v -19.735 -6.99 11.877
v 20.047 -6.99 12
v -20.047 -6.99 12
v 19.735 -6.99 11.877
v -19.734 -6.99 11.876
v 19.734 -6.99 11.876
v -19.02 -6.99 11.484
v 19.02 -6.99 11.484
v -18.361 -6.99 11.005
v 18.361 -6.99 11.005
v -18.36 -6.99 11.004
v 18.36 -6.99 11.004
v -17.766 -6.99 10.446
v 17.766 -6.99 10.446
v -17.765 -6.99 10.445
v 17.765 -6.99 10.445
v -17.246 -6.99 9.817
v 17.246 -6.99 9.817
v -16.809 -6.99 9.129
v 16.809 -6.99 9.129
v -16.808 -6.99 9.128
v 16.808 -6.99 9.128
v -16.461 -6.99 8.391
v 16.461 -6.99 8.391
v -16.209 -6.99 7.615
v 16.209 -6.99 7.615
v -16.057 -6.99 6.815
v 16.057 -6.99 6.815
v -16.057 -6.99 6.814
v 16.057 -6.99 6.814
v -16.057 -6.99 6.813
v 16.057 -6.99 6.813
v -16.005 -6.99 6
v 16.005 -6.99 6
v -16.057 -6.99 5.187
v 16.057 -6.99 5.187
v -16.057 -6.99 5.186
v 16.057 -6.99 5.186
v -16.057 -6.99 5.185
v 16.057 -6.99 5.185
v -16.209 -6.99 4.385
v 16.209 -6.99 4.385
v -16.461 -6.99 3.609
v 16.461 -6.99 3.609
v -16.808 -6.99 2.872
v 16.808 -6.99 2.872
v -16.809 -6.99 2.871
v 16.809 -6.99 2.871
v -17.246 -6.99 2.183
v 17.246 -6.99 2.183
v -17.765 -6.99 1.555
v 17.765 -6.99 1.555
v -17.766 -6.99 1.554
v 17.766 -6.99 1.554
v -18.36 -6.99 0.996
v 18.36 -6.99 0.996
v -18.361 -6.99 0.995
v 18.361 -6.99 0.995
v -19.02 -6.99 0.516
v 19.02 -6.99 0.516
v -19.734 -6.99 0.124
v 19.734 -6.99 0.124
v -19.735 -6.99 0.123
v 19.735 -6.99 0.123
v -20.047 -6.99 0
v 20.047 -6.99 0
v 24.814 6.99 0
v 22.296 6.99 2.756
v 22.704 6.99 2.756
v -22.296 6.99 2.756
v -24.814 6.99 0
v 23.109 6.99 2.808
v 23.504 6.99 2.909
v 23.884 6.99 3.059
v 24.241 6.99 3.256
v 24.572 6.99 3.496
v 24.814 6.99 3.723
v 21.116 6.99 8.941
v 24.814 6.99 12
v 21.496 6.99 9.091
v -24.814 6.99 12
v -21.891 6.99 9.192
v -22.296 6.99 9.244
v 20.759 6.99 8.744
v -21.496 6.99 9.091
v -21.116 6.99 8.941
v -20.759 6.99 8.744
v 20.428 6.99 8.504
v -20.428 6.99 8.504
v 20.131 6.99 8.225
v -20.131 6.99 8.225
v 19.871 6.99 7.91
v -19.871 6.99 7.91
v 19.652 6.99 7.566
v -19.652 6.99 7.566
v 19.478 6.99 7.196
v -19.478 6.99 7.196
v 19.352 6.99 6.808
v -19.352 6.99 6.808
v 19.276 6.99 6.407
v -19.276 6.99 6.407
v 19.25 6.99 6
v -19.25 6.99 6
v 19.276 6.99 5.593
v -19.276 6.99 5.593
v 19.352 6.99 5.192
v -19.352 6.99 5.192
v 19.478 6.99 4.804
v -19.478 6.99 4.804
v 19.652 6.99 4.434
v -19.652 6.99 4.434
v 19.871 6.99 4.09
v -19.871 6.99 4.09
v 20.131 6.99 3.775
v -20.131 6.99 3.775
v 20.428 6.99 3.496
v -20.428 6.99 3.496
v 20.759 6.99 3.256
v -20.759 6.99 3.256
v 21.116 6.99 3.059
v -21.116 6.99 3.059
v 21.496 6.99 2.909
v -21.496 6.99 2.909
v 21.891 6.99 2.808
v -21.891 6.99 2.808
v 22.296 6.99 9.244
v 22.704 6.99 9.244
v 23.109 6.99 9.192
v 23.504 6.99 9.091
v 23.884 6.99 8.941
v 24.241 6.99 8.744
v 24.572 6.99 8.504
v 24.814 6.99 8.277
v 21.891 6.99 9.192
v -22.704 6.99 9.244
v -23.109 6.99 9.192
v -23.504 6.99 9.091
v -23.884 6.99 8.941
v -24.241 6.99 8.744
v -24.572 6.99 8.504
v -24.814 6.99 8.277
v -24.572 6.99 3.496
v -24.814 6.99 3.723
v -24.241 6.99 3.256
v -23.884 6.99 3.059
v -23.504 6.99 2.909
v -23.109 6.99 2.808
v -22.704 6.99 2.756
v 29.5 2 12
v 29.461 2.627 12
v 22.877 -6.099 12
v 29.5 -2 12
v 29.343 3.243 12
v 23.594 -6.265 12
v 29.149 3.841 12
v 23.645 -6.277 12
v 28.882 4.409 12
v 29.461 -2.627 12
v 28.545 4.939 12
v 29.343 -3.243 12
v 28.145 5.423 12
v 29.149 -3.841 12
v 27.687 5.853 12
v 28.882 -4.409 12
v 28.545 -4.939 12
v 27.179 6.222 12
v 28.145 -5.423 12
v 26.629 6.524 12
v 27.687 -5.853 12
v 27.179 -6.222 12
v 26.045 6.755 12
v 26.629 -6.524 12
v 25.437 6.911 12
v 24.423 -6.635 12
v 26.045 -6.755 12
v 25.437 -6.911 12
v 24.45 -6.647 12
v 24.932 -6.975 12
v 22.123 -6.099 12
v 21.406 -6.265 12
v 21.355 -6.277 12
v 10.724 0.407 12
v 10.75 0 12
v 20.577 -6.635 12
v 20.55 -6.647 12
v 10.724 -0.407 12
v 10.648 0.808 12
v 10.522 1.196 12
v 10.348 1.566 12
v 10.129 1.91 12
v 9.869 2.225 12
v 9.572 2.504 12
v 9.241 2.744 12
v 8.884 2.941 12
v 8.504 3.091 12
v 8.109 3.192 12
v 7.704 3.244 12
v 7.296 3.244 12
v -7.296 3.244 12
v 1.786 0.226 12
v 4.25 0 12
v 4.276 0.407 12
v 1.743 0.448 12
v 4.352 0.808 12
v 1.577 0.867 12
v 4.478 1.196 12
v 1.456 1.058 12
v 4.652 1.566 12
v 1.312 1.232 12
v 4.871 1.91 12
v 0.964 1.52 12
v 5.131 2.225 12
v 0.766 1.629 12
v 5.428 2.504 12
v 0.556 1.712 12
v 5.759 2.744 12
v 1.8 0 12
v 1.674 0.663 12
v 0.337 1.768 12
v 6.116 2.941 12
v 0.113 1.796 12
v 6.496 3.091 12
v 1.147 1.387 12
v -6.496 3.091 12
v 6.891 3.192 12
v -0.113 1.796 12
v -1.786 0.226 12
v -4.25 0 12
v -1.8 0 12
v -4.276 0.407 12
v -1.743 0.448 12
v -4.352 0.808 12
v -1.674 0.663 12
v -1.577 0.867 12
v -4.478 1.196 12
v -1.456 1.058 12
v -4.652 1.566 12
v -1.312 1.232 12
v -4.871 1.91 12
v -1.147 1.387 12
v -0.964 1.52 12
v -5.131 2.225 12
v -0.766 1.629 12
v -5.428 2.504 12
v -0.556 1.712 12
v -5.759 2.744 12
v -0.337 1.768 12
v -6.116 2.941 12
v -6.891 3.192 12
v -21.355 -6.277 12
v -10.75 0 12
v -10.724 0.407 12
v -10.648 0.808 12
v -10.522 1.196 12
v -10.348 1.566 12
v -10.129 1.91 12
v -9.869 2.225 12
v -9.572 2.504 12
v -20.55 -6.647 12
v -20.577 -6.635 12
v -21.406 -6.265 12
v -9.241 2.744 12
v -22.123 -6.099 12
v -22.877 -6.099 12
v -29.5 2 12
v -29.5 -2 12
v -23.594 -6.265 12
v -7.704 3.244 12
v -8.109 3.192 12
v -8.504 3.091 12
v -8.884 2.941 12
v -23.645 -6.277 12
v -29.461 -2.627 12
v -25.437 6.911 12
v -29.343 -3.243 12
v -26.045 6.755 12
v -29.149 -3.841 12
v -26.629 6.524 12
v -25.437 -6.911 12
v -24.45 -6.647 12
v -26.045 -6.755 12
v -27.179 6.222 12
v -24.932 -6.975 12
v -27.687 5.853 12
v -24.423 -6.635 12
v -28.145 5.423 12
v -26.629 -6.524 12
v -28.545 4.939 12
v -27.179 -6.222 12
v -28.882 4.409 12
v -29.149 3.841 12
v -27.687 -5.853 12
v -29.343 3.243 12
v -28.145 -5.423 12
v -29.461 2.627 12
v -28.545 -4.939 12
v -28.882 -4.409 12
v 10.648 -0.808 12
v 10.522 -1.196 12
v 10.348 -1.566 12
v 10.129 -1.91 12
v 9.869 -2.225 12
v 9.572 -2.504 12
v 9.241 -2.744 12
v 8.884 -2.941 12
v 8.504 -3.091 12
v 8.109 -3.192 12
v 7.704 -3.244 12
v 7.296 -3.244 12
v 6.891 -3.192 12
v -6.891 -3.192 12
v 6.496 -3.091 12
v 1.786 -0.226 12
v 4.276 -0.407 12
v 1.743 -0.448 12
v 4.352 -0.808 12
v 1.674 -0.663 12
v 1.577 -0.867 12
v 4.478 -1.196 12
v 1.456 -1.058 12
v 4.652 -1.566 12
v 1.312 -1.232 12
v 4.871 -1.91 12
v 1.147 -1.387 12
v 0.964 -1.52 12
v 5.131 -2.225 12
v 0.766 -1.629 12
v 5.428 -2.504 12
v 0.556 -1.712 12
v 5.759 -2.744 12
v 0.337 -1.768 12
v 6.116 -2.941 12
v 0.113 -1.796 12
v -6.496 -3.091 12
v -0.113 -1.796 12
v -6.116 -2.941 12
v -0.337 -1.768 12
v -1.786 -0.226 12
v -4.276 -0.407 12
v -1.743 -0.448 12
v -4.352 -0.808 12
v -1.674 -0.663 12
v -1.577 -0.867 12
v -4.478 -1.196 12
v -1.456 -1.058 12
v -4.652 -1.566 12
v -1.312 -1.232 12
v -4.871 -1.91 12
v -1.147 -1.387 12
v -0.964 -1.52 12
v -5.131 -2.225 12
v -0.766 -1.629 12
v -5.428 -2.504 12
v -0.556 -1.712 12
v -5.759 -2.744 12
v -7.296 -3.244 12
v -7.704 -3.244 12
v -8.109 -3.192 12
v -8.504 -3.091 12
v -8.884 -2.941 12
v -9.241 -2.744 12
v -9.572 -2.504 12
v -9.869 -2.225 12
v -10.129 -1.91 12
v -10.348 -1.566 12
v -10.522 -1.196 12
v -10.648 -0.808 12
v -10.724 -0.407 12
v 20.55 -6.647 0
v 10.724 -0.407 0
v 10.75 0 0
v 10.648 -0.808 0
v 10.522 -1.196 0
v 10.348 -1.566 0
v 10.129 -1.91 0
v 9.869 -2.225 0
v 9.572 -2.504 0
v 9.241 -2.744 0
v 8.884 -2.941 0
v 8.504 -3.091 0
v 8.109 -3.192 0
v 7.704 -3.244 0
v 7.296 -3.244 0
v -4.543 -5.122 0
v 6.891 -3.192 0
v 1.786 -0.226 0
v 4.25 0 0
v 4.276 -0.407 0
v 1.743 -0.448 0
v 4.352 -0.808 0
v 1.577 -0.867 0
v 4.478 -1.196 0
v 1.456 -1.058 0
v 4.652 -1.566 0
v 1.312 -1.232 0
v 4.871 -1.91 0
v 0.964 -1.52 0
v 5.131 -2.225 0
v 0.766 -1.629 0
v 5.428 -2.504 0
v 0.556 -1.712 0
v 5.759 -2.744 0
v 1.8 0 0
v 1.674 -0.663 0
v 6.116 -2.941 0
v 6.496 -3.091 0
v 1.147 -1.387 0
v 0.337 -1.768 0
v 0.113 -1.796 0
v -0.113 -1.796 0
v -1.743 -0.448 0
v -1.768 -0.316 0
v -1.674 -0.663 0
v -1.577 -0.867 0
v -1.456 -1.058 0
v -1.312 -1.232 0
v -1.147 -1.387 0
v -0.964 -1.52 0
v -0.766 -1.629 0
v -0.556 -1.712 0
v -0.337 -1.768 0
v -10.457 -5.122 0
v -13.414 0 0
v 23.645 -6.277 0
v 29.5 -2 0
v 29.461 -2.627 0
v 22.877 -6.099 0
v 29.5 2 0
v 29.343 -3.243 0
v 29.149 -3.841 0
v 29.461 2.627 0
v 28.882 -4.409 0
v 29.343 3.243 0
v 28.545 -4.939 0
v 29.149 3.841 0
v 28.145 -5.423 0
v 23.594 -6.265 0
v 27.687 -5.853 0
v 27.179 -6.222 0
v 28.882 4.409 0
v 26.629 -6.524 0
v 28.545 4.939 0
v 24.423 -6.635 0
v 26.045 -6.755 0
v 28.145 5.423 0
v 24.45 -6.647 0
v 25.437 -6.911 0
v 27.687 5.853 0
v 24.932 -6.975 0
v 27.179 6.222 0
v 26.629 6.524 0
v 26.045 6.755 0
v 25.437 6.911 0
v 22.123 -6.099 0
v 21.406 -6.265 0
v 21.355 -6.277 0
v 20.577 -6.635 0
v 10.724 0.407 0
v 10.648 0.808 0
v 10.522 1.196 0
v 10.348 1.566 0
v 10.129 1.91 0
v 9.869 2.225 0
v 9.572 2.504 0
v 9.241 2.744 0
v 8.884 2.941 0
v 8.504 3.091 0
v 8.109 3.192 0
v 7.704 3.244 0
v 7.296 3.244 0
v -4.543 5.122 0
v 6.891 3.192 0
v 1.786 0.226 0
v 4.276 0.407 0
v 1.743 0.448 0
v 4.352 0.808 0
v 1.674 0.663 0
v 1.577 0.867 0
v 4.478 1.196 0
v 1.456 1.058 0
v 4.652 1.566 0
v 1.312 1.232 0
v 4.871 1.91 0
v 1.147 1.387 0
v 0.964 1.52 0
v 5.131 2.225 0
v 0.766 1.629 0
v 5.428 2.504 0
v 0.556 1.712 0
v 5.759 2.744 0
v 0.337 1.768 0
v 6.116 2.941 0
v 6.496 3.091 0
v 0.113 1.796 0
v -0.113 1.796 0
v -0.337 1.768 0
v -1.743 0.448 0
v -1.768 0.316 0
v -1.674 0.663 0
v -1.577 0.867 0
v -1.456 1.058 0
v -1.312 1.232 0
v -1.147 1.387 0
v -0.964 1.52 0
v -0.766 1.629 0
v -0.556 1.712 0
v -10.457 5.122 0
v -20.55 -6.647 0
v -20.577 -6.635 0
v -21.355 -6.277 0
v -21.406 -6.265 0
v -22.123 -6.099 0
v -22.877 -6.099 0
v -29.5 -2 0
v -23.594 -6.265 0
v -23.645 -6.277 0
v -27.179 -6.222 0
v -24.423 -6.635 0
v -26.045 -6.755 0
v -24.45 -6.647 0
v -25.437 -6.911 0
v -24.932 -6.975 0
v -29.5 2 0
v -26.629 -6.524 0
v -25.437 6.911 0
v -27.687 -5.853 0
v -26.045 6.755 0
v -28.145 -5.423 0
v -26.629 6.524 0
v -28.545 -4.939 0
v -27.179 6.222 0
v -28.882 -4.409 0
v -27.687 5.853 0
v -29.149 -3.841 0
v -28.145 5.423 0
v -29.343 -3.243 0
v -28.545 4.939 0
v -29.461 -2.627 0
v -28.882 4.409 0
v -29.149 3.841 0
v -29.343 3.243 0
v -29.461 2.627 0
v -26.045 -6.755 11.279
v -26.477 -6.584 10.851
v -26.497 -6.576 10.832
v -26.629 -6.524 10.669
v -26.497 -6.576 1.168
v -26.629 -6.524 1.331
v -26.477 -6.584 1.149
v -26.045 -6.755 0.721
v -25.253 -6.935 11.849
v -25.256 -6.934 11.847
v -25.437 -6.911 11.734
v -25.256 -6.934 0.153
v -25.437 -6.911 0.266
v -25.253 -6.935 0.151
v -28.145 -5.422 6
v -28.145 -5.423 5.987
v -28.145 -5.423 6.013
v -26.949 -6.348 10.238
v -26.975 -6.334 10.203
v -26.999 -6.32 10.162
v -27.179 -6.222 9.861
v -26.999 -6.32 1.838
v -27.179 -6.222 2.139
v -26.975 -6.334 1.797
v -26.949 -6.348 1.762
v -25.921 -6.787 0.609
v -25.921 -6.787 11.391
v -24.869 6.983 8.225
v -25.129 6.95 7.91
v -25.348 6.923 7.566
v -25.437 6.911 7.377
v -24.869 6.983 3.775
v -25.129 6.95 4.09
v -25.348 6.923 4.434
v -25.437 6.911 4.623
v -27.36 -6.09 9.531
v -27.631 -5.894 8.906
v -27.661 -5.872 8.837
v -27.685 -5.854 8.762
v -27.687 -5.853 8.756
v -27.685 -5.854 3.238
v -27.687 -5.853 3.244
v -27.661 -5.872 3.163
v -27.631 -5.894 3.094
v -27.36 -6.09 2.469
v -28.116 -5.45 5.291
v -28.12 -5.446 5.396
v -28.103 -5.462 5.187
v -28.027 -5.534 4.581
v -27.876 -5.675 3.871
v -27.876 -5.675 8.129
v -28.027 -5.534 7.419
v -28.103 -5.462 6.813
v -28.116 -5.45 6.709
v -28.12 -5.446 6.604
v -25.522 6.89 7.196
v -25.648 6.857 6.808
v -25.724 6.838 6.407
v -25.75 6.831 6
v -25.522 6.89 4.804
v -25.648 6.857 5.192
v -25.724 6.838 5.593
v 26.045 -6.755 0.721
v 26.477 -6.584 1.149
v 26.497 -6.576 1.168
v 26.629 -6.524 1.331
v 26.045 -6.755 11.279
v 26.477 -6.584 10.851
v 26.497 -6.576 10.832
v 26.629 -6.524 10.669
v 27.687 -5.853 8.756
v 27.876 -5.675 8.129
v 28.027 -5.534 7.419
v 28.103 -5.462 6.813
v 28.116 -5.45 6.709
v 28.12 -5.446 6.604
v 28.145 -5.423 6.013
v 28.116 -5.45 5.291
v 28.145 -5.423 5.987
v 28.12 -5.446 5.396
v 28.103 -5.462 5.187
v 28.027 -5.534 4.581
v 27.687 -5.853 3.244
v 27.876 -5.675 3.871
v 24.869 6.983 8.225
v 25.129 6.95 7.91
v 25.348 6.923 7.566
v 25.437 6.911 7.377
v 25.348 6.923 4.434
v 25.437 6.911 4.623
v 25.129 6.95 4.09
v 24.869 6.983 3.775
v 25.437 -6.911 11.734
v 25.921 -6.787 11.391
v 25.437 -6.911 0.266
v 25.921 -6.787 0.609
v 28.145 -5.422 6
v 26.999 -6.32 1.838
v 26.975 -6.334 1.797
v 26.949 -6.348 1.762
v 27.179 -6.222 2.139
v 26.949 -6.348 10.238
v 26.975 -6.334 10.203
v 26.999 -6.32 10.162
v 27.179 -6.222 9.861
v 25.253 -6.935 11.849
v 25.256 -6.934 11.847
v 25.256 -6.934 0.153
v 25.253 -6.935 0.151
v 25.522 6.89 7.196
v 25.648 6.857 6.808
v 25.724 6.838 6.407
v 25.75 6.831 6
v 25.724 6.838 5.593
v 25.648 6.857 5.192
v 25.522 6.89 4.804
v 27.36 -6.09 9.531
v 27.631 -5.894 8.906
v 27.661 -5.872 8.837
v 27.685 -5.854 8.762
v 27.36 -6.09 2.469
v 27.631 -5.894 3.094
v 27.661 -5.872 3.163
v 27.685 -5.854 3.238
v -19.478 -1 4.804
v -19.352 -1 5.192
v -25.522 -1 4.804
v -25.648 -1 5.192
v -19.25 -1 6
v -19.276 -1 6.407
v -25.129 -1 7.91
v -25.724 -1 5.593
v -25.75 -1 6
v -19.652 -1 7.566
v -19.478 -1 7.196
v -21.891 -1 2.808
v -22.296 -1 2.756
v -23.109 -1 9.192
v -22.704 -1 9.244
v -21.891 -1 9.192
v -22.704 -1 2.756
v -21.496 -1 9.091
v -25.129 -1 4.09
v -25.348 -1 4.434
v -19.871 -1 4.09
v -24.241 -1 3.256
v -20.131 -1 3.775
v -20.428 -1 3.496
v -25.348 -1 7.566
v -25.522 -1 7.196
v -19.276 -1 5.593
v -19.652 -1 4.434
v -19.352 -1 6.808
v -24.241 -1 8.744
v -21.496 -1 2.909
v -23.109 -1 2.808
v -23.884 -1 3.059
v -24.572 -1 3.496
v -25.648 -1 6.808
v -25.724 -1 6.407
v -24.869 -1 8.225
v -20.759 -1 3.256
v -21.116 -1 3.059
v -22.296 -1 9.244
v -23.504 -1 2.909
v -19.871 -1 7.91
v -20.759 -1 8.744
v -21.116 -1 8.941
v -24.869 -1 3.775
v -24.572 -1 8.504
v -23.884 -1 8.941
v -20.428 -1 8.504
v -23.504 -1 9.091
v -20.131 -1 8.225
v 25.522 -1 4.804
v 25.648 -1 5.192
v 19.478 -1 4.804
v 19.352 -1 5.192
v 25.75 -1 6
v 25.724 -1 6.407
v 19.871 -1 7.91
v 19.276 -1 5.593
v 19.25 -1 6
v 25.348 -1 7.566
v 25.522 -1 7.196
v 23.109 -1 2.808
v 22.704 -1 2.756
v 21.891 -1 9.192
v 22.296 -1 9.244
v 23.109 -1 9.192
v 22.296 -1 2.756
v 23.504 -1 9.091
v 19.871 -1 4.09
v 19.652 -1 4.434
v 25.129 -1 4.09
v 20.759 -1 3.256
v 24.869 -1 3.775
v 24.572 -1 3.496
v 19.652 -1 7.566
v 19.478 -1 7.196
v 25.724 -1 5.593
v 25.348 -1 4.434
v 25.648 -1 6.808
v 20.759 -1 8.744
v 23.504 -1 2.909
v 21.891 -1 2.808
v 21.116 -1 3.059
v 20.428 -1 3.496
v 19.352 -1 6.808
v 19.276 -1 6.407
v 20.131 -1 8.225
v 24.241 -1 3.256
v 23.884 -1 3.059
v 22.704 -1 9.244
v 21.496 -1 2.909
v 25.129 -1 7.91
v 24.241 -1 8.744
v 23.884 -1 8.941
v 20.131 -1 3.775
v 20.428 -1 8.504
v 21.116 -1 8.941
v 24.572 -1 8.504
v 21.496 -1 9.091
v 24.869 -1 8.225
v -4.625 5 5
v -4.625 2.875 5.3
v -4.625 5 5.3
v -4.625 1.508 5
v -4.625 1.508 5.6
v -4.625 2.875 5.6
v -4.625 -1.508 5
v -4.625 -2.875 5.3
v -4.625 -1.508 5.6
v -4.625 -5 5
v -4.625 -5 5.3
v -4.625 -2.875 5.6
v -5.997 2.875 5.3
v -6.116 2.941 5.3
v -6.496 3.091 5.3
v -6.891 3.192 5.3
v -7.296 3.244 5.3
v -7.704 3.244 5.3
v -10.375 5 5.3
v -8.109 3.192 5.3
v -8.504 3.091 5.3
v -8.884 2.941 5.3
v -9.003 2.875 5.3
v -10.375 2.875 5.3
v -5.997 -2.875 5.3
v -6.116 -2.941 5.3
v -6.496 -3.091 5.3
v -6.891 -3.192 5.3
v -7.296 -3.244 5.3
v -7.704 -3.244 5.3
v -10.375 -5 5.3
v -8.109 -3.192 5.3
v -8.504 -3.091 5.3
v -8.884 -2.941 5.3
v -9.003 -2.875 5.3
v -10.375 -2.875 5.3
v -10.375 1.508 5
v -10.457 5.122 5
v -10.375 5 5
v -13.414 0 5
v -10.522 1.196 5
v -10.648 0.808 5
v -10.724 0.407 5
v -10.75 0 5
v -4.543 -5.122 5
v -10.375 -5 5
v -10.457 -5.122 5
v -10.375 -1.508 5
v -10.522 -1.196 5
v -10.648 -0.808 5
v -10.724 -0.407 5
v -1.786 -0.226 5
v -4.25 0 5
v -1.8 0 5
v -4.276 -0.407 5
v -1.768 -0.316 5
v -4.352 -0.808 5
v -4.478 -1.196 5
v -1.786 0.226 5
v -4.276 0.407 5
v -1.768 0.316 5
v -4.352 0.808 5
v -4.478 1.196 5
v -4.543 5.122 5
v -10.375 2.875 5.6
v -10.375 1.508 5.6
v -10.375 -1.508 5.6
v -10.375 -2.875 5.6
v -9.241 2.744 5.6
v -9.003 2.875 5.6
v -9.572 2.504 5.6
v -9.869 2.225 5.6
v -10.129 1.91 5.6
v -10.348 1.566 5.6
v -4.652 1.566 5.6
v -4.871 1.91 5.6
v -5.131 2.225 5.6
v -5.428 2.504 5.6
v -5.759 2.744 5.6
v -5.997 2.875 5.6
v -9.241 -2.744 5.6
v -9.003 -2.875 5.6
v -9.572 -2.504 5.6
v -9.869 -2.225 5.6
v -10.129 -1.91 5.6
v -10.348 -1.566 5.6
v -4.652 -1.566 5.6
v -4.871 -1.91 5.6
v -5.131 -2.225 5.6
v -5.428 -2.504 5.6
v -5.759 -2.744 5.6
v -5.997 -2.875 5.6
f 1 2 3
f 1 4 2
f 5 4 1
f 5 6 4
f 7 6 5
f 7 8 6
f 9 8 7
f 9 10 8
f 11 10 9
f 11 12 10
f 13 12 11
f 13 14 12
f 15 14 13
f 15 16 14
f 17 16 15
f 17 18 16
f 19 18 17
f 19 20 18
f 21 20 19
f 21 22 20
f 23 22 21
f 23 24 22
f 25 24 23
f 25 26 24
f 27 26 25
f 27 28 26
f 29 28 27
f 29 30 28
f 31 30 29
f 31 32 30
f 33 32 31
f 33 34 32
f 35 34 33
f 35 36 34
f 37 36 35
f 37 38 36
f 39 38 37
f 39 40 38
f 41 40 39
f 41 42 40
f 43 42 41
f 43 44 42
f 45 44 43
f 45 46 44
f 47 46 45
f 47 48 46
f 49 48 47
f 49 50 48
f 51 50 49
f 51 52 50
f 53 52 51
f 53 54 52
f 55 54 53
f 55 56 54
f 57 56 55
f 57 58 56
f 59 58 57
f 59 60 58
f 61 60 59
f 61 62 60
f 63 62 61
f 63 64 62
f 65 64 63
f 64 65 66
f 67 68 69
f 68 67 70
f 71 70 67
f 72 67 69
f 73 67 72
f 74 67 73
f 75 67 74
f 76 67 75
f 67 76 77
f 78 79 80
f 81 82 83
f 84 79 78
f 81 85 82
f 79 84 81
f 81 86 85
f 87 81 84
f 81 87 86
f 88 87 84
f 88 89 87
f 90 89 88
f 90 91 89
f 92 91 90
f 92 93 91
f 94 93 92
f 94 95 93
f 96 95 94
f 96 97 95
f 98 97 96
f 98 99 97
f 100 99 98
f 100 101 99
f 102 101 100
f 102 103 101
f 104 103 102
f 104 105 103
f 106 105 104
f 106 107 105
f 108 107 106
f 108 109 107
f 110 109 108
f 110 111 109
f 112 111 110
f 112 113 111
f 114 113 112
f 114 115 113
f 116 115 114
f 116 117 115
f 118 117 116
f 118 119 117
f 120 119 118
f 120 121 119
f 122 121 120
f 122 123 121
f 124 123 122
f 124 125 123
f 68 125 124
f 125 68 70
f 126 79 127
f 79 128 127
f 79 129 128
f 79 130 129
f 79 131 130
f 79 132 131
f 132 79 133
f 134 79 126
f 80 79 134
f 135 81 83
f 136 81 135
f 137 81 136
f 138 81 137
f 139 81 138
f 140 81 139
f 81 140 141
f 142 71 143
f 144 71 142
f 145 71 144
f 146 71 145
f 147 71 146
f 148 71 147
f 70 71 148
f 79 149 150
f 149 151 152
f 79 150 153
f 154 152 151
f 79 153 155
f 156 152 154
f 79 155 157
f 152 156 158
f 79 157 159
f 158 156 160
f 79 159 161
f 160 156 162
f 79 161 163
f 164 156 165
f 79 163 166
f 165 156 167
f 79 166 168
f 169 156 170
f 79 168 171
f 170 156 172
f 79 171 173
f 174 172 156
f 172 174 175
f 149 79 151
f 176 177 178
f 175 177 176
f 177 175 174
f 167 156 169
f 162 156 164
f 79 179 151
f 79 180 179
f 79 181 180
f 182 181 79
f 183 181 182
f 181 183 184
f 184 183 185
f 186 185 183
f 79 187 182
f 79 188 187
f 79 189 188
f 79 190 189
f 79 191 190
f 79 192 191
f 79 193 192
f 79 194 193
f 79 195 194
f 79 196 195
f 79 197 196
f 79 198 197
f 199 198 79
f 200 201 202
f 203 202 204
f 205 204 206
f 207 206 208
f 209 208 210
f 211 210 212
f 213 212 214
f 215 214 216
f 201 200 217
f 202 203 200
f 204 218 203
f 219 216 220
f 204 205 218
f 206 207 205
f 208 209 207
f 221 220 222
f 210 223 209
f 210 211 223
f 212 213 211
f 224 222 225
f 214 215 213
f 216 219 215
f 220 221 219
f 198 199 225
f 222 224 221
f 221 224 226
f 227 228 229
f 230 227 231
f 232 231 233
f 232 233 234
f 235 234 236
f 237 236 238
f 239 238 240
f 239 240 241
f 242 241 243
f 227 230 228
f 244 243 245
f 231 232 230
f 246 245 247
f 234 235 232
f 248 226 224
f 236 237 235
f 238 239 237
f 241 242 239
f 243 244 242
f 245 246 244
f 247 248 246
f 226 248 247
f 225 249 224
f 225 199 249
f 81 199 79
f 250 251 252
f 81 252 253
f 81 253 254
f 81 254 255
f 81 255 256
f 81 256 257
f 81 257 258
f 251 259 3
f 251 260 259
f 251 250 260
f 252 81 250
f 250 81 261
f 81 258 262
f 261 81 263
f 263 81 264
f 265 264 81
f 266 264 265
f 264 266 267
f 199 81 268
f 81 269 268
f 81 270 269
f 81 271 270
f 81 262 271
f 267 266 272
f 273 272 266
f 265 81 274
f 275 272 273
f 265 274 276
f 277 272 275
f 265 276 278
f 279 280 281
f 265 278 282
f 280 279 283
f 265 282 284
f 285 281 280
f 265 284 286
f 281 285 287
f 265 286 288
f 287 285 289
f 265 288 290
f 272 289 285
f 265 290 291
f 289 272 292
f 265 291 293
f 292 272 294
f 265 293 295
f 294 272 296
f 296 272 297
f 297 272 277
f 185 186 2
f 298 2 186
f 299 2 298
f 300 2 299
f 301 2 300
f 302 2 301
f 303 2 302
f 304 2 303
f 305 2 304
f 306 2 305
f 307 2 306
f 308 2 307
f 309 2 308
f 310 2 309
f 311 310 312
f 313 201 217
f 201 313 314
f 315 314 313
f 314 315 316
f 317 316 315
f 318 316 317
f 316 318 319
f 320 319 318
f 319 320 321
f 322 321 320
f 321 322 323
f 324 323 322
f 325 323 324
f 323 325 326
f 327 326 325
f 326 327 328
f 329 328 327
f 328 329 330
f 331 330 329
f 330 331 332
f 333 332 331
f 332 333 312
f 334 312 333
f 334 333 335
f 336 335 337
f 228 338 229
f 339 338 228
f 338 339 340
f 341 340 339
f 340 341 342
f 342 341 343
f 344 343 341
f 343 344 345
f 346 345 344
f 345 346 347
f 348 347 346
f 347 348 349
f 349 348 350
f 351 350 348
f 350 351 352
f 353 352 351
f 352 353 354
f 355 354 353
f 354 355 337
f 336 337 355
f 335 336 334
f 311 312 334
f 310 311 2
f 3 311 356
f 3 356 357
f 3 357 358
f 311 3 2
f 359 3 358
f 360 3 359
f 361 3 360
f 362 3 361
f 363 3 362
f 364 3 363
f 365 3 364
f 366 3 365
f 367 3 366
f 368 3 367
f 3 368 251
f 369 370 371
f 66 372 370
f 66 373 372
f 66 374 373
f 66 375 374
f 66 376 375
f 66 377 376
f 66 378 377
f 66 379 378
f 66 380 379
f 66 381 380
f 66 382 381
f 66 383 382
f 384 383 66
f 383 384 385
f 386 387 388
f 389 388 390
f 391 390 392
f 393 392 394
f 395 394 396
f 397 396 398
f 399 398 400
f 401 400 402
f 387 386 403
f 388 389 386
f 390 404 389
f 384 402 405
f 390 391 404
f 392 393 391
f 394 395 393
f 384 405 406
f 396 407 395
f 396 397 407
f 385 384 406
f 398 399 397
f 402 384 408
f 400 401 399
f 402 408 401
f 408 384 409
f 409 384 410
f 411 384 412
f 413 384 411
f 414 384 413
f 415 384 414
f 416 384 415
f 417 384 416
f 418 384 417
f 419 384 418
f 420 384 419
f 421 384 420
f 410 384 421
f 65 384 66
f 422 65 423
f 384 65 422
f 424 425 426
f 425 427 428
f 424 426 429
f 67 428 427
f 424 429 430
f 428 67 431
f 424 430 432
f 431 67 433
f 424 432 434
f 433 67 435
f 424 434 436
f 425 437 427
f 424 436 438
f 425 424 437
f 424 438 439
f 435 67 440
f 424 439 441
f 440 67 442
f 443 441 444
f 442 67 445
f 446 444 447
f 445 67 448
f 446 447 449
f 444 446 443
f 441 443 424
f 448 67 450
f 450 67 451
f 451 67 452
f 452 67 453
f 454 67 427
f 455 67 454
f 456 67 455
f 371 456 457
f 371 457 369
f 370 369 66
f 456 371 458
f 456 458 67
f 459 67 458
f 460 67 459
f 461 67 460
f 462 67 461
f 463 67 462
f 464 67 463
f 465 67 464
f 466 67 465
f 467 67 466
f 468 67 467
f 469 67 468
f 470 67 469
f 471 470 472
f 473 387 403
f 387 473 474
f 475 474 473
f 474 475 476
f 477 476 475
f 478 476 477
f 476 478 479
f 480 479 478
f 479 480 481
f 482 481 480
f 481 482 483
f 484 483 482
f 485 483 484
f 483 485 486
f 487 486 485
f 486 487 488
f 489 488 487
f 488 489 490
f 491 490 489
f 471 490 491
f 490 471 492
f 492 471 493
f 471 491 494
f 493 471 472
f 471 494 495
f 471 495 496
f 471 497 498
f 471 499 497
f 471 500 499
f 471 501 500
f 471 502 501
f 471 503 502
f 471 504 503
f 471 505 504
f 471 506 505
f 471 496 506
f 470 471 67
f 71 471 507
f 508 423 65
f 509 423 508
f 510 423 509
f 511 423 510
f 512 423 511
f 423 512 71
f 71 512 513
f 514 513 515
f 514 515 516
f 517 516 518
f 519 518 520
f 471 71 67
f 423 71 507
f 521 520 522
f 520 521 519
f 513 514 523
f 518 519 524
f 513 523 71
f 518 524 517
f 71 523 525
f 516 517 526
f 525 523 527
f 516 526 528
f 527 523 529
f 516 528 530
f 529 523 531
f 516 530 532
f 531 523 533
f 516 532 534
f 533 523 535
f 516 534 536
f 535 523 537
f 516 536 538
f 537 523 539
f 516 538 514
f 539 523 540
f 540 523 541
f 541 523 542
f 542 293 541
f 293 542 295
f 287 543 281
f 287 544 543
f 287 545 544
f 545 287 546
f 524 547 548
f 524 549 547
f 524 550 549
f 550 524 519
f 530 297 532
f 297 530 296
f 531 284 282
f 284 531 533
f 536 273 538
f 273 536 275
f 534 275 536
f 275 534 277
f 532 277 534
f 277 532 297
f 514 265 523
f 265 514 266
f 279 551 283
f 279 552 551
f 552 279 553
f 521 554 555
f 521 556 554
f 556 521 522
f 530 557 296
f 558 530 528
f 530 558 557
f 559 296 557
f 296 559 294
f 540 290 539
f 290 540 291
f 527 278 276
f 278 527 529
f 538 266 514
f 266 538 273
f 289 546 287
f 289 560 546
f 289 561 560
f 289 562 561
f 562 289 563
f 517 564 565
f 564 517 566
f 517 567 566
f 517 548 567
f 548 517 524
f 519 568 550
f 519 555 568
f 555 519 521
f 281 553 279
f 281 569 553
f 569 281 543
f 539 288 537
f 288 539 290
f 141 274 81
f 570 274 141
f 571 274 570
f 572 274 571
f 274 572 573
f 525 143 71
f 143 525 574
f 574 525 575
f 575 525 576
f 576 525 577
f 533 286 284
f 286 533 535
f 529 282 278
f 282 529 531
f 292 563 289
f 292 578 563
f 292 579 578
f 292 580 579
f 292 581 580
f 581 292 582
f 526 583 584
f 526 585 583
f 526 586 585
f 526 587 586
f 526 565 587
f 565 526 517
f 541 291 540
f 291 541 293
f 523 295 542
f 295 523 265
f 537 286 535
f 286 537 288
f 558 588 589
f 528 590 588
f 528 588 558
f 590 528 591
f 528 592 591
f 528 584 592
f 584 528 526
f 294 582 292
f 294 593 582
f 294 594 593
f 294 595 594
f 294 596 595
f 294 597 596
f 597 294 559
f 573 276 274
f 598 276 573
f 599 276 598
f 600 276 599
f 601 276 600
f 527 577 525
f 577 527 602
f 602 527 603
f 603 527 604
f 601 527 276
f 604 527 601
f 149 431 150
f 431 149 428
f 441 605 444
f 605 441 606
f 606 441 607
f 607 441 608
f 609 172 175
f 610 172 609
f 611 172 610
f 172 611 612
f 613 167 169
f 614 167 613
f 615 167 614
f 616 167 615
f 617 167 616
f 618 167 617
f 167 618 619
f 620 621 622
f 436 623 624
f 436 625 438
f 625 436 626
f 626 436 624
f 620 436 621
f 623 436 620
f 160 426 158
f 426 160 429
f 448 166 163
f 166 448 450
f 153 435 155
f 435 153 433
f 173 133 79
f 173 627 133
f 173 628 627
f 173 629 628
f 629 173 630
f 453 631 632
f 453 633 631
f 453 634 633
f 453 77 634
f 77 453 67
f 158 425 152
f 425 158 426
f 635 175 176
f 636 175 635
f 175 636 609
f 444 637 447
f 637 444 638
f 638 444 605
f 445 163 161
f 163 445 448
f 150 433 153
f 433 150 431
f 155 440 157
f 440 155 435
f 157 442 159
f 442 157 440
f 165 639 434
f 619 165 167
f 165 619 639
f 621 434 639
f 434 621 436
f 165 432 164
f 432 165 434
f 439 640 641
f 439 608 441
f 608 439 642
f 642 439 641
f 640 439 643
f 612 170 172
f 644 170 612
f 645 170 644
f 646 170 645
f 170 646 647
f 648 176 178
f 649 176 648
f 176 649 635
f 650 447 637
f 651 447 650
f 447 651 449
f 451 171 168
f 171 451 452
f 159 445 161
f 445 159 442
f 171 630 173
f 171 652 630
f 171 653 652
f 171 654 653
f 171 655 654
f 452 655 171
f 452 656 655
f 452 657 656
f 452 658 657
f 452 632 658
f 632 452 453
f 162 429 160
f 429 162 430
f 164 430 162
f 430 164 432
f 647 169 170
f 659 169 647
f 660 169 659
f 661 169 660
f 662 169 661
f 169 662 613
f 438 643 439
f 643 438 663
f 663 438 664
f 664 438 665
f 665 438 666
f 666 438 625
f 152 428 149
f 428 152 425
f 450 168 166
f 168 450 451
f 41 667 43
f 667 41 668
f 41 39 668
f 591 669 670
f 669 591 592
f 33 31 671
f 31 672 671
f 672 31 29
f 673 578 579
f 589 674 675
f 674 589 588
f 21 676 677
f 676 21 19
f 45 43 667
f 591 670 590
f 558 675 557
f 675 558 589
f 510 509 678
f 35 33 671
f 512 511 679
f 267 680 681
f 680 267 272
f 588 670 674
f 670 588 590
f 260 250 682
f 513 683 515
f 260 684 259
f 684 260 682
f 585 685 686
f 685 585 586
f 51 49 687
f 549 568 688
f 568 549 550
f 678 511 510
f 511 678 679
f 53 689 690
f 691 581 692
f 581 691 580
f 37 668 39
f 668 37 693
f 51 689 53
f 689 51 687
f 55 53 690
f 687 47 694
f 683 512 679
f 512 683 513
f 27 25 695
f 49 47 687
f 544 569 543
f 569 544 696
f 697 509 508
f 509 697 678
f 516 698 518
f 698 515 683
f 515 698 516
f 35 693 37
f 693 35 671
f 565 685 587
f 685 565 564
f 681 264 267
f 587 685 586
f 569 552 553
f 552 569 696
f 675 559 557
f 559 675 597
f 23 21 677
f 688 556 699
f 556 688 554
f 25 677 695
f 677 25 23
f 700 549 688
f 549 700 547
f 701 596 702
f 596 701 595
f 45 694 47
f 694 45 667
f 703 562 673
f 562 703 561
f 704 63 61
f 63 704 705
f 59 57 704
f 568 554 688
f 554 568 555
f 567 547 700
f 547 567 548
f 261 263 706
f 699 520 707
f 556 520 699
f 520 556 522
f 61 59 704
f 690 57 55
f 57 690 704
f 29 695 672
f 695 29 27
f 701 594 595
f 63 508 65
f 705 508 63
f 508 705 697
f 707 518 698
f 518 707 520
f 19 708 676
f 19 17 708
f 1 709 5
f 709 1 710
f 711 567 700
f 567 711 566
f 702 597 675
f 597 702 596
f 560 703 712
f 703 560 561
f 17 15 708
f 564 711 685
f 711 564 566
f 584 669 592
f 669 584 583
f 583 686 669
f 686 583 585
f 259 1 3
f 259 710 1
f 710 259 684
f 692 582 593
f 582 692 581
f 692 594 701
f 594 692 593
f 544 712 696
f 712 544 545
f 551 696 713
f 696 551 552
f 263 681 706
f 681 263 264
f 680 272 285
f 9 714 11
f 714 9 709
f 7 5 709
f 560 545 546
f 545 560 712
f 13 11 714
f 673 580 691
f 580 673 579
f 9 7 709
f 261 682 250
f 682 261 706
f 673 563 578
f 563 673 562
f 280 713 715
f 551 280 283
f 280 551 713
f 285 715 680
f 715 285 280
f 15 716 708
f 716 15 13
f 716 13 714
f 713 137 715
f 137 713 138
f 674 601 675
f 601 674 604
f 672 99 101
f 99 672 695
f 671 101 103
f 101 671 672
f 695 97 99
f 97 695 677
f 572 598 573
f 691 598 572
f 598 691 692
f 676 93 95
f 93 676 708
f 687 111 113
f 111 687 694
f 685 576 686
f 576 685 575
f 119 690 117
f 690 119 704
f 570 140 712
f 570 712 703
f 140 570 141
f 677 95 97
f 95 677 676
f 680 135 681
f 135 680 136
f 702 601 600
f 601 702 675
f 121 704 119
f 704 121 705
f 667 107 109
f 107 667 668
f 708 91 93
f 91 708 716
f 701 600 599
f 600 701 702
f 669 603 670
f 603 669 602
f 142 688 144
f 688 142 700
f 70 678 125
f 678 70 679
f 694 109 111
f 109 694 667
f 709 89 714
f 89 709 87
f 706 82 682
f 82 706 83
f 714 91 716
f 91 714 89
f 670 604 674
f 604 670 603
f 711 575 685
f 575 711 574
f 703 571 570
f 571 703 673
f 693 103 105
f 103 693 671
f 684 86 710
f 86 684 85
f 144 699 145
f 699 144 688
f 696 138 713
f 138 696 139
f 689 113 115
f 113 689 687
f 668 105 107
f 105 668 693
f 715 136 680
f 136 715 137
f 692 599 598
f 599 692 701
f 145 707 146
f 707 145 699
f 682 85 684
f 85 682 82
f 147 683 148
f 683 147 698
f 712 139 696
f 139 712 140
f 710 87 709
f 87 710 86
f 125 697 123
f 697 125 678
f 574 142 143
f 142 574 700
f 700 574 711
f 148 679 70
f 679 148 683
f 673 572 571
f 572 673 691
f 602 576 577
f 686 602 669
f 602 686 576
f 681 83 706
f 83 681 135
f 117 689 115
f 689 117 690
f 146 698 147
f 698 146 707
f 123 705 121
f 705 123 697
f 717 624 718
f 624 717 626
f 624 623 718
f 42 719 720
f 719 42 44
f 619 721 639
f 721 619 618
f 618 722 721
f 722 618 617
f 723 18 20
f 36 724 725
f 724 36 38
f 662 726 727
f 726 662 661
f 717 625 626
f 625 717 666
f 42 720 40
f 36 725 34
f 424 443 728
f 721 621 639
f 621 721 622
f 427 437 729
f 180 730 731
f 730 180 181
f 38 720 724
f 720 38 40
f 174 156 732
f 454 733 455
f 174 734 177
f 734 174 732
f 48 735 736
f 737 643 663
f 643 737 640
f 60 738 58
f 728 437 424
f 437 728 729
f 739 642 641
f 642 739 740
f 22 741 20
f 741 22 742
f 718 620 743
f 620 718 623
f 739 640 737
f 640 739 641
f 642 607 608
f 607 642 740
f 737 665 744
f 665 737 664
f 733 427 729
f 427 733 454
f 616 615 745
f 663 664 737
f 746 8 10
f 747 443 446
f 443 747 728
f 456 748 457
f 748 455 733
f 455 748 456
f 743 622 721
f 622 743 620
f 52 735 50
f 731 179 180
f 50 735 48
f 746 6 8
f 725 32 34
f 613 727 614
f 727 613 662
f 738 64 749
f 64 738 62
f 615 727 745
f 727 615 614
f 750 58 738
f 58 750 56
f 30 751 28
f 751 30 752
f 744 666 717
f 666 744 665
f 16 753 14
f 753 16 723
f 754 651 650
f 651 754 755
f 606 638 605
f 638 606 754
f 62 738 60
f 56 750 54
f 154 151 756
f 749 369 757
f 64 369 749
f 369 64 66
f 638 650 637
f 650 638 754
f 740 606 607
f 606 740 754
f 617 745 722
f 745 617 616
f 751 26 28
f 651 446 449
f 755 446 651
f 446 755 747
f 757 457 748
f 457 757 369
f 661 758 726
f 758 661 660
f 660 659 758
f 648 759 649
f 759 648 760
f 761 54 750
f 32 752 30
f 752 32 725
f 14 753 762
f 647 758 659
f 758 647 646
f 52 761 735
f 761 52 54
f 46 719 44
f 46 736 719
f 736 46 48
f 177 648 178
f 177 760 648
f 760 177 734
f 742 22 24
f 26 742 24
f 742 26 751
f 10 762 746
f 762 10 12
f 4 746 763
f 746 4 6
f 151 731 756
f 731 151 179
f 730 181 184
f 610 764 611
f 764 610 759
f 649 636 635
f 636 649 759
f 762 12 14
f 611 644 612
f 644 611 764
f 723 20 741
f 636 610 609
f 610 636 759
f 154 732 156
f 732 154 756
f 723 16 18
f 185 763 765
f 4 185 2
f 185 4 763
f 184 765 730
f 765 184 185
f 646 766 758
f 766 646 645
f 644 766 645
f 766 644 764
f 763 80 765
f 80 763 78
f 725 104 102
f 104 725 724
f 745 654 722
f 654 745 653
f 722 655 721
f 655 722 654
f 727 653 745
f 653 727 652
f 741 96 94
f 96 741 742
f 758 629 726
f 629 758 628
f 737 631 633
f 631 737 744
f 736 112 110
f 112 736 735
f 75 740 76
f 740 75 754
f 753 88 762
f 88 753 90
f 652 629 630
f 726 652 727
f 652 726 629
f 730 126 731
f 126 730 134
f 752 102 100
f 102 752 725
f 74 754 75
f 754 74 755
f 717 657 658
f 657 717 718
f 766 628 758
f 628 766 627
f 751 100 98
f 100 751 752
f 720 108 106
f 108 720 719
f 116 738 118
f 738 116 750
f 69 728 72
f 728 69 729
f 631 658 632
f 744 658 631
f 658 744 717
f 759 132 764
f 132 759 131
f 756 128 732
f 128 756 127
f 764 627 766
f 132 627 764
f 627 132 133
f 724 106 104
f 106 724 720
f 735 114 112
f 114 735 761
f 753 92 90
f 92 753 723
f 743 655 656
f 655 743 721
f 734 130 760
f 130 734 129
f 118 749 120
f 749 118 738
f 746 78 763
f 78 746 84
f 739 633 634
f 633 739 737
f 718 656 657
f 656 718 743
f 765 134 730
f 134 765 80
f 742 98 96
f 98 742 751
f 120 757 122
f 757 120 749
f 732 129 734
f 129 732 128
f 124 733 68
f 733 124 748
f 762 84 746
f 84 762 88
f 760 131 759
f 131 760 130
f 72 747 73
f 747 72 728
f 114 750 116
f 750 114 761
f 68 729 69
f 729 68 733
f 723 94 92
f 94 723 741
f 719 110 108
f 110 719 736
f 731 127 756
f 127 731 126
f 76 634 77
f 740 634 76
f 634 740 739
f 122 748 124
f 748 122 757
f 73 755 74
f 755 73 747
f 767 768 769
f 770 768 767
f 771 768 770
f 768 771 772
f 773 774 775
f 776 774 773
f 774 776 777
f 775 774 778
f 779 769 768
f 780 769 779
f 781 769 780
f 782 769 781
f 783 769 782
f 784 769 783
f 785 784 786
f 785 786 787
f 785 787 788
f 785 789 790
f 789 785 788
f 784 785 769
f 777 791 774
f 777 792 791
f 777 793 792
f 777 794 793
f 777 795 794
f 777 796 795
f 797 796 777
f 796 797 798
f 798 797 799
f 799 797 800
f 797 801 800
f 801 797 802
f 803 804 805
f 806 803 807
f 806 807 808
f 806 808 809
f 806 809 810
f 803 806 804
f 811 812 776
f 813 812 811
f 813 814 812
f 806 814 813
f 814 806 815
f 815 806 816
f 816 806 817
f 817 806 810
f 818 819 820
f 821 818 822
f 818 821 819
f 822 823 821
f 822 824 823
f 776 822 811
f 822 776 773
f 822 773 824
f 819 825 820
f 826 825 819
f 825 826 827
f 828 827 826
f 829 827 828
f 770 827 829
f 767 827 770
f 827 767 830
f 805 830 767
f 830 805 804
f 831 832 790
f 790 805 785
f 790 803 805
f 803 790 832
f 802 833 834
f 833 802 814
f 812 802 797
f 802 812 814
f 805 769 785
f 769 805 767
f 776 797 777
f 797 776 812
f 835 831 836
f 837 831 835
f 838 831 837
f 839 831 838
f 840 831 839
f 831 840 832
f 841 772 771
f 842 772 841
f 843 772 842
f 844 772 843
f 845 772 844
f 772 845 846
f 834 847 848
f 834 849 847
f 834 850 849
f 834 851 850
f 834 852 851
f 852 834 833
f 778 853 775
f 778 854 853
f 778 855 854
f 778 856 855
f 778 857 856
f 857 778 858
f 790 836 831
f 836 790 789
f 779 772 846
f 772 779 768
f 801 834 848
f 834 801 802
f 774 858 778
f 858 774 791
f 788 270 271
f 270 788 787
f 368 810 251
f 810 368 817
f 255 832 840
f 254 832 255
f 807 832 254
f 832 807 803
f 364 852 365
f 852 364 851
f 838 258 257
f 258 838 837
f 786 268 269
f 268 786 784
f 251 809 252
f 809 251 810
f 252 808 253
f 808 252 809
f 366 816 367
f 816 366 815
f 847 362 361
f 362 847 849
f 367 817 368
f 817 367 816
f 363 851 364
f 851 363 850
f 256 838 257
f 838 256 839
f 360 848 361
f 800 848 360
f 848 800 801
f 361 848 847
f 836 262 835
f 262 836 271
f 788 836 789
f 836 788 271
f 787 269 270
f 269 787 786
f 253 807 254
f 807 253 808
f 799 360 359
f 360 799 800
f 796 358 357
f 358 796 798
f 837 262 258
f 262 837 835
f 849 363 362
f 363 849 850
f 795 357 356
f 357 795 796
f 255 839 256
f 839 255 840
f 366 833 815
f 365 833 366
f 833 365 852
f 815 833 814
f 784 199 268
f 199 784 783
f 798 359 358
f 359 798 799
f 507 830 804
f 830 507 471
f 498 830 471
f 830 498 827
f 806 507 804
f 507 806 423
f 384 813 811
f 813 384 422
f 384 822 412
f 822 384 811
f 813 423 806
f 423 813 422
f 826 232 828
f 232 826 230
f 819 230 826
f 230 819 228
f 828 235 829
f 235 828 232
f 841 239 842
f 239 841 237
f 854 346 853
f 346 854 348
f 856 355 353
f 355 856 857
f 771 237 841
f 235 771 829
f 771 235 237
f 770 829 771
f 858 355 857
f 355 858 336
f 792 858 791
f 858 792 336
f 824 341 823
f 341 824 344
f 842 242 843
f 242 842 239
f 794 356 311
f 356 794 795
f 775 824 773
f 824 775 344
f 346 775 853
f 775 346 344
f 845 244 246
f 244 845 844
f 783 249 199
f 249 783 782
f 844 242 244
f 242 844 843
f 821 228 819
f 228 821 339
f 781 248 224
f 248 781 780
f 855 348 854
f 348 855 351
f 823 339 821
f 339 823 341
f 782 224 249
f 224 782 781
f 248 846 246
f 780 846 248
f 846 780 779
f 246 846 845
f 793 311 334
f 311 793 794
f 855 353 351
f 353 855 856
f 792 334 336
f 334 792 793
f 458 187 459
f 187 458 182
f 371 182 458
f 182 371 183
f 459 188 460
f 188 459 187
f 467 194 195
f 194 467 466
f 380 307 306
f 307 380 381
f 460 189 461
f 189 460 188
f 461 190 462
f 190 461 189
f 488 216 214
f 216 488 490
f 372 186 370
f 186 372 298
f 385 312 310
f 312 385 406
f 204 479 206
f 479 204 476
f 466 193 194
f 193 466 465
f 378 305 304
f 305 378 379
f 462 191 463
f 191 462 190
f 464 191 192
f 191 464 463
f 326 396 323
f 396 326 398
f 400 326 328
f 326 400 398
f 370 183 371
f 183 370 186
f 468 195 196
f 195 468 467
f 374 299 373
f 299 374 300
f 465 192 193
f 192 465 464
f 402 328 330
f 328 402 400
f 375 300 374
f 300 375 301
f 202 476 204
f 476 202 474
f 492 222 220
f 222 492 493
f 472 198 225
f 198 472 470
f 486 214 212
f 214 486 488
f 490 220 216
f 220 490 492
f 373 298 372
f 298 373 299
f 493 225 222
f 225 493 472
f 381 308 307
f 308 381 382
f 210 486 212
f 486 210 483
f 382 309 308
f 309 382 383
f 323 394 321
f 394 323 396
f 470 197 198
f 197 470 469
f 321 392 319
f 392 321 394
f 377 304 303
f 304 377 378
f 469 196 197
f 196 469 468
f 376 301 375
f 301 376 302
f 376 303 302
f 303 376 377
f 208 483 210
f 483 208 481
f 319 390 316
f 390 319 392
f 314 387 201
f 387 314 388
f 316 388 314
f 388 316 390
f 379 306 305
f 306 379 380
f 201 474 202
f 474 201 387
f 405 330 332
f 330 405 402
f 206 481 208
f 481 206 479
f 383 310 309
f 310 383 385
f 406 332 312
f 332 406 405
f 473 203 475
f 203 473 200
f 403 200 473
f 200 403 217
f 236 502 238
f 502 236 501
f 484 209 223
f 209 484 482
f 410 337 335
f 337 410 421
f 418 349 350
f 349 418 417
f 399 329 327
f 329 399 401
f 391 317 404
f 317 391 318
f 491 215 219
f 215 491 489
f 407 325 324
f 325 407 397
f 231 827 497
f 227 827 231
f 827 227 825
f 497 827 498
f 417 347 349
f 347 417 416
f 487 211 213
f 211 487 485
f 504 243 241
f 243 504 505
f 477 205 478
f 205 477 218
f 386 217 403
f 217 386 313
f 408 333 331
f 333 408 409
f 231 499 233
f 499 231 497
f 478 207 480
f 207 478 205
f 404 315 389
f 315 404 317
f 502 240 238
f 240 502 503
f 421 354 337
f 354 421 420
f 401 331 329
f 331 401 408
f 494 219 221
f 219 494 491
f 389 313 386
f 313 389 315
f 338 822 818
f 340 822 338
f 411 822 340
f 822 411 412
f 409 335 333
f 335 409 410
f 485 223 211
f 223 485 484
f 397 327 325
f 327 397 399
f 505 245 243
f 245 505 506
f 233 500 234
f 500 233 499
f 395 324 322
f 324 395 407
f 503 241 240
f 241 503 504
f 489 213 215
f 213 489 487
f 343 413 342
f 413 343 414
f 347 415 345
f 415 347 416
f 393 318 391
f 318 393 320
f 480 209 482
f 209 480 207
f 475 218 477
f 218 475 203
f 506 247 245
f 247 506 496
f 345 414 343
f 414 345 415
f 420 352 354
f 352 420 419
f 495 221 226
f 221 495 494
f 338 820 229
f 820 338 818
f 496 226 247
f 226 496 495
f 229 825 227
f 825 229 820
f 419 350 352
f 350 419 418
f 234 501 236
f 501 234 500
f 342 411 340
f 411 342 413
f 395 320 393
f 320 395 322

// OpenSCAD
$fn = 50;


difference() {
	union() {
		hull() {
			translate(v = [-9.5000000000, 2.0000000000, 0]) {
				cylinder(h = 12, r = 5);
			}
			translate(v = [9.5000000000, 2.0000000000, 0]) {
				cylinder(h = 12, r = 5);
			}
			translate(v = [-9.5000000000, -2.0000000000, 0]) {
				cylinder(h = 12, r = 5);
			}
			translate(v = [9.5000000000, -2.0000000000, 0]) {
				cylinder(h = 12, r = 5);
			}
		}
		translate(v = [-15.0000000000, 0.0000000000, 0]) {
			hull() {
				translate(v = [-9.5000000000, 2.0000000000, 0]) {
					cylinder(h = 12, r = 5);
				}
				translate(v = [9.5000000000, 2.0000000000, 0]) {
					cylinder(h = 12, r = 5);
				}
				translate(v = [-9.5000000000, -2.0000000000, 0]) {
					cylinder(h = 12, r = 5);
				}
				translate(v = [9.5000000000, -2.0000000000, 0]) {
					cylinder(h = 12, r = 5);
				}
			}
		}
		translate(v = [15.0000000000, 0.0000000000, 0]) {
			hull() {
				translate(v = [-9.5000000000, 2.0000000000, 0]) {
					cylinder(h = 12, r = 5);
				}
				translate(v = [9.5000000000, 2.0000000000, 0]) {
					cylinder(h = 12, r = 5);
				}
				translate(v = [-9.5000000000, -2.0000000000, 0]) {
					cylinder(h = 12, r = 5);
				}
				translate(v = [9.5000000000, -2.0000000000, 0]) {
					cylinder(h = 12, r = 5);
				}
			}
		}
	}
	union() {
		translate(v = [-22.5000000000, -7.0000000000, 6.0000000000]) {
			rotate(a = [90, 0, 0]) {
				difference() {
					union() {
						#translate(v = [0, 0, -14.0000000000]) {
							cylinder(h = 14, r = 2.2500000000);
						}
						#translate(v = [0, 0, -6]) {
							cylinder(h = 6, r1 = 3.2500000000, r2 = 6.5000000000);
						}
						#translate(v = [0, 0, -14.0000000000]) {
							cylinder(h = 14, r = 3.2500000000);
						}
						#translate(v = [0, 0, -14.0000000000]) {
							cylinder(h = 14, r = 2.2500000000);
						}
					}
					union();
				}
			}
		}
		translate(v = [22.5000000000, -7.0000000000, 6.0000000000]) {
			rotate(a = [90, 0, 0]) {
				difference() {
					union() {
						#translate(v = [0, 0, -14.0000000000]) {
							cylinder(h = 14, r = 2.2500000000);
						}
						#translate(v = [0, 0, -6]) {
							cylinder(h = 6, r1 = 3.2500000000, r2 = 6.5000000000);
						}
						#translate(v = [0, 0, -14.0000000000]) {
							cylinder(h = 14, r = 3.2500000000);
						}
						#translate(v = [0, 0, -14.0000000000]) {
							cylinder(h = 14, r = 2.2500000000);
						}
					}
					union();
				}
			}
		}
		translate(v = [-7.5000000000, 0.0000000000, 0]) {
			rotate(a = [0, 0, 0]) {
				difference() {
					union() {
						#translate(v = [-2.8750000000, -5.0000000000, -0.3000000000]) {
							cube(size = [5.7500000000, 10, 0.3000000000]);
						}
						#translate(v = [-2.8750000000, -2.8750000000, -0.6000000000]) {
							cube(size = [5.7500000000, 5.7500000000, 0.3000000000]);
						}
						#translate(v = [-2.8750000000, -5.0000000000, 5]) {
							cube(size = [5.7500000000, 10, 0.3000000000]);
						}
						#translate(v = [-2.8750000000, -2.8750000000, 5.3000000000]) {
							cube(size = [5.7500000000, 5.7500000000, 0.3000000000]);
						}
						#translate(v = [0, 0, -100.0000000000]) {
							cylinder(h = 200, r = 3.2500000000);
						}
						#linear_extrude(height = 5) {
							polygon(points = [[5.9142500000, 0.0000000000], [2.9571250000, 5.1218907443], [-2.9571250000, 5.1218907443], [-5.9142500000, 0.0000000000], [-2.9571250000, -5.1218907443], [2.9571250000, -5.1218907443]]);
						}
						#translate(v = [-2.8750000000, -5.0000000000, -0.3000000000]) {
							cube(size = [5.7500000000, 10, 0.3000000000]);
						}
						#translate(v = [-2.8750000000, -2.8750000000, -0.6000000000]) {
							cube(size = [5.7500000000, 5.7500000000, 0.3000000000]);
						}
						#translate(v = [-2.8750000000, -5.0000000000, 5]) {
							cube(size = [5.7500000000, 10, 0.3000000000]);
						}
						#translate(v = [-2.8750000000, -2.8750000000, 5.3000000000]) {
							cube(size = [5.7500000000, 5.7500000000, 0.3000000000]);
						}
						#translate(v = [0, 0, -100.0000000000]) {
							cylinder(h = 200, r = 3.2500000000);
						}
						#translate(v = [-2.8750000000, -5.0000000000, -0.3000000000]) {
							cube(size = [5.7500000000, 10, 0.3000000000]);
						}
						#translate(v = [-2.8750000000, -2.8750000000, -0.6000000000]) {
							cube(size = [5.7500000000, 5.7500000000, 0.3000000000]);
						}
						#translate(v = [-2.8750000000, -5.0000000000, 5]) {
							cube(size = [5.7500000000, 10, 0.3000000000]);
						}
						#translate(v = [-2.8750000000, -2.8750000000, 5.3000000000]) {
							cube(size = [5.7500000000, 5.7500000000, 0.3000000000]);
						}
						#translate(v = [0, 0, -100.0000000000]) {
							cylinder(h = 200, r = 3.2500000000);
						}
					}
					union();
				}
			}
		}
		translate(v = [-7.5000000000, 0.0000000000, 0]) {
			translate(v = [0, 0, -100]) {
				cylinder(h = 200, r = 3.2500000000);
			}
		}
		translate(v = [7.5000000000, 0.0000000000, 0]) {
			translate(v = [0, 0, -100]) {
				cylinder(h = 200, r = 3.2500000000);
			}
		}
		translate(v = [-7.5000000000, 0.0000000000, 0]) {
			translate(v = [0, 0, -100]) {
				cylinder(h = 200, r = 1.8000000000);
			}
		}
		translate(v = [0, 0, -100]) {
			cylinder(h = 200, r = 1.8000000000);
		}
		translate(v = [7.5000000000, 0.0000000000, 0]) {
			translate(v = [0, 0, -100]) {
				cylinder(h = 200, r = 1.8000000000);
			}
		}
	}
}
